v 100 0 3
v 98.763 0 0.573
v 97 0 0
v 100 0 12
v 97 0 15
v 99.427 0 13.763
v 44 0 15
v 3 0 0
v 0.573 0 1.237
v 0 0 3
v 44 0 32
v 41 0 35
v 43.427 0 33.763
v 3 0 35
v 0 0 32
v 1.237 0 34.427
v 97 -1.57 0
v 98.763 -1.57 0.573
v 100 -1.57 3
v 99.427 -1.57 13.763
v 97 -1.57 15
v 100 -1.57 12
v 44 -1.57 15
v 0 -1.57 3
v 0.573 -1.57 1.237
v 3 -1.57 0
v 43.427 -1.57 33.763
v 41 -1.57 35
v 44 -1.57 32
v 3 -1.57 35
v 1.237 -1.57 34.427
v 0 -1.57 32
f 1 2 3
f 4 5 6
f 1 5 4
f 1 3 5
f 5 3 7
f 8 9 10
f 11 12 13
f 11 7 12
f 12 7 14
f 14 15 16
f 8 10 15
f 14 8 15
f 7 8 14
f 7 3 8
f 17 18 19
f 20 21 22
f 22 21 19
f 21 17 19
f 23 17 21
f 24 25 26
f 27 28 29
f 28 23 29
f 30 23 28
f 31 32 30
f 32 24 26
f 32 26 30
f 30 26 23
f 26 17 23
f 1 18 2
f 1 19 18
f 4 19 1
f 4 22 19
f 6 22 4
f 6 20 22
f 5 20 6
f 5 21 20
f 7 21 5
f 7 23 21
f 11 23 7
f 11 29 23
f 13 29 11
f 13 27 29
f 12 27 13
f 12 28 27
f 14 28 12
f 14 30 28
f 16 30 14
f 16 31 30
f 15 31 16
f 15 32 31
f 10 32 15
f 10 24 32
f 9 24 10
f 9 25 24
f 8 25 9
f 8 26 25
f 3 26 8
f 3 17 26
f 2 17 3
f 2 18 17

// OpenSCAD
color("black")
rotate([90,0,0])
linear_extrude(1.57) 
difference() {
  offset(r=3) offset(delta=-3) polygon(
  [[0,0],[0,35],[44,35],
  [44,15],[100,15],[100,0],[0,0]]);
}
